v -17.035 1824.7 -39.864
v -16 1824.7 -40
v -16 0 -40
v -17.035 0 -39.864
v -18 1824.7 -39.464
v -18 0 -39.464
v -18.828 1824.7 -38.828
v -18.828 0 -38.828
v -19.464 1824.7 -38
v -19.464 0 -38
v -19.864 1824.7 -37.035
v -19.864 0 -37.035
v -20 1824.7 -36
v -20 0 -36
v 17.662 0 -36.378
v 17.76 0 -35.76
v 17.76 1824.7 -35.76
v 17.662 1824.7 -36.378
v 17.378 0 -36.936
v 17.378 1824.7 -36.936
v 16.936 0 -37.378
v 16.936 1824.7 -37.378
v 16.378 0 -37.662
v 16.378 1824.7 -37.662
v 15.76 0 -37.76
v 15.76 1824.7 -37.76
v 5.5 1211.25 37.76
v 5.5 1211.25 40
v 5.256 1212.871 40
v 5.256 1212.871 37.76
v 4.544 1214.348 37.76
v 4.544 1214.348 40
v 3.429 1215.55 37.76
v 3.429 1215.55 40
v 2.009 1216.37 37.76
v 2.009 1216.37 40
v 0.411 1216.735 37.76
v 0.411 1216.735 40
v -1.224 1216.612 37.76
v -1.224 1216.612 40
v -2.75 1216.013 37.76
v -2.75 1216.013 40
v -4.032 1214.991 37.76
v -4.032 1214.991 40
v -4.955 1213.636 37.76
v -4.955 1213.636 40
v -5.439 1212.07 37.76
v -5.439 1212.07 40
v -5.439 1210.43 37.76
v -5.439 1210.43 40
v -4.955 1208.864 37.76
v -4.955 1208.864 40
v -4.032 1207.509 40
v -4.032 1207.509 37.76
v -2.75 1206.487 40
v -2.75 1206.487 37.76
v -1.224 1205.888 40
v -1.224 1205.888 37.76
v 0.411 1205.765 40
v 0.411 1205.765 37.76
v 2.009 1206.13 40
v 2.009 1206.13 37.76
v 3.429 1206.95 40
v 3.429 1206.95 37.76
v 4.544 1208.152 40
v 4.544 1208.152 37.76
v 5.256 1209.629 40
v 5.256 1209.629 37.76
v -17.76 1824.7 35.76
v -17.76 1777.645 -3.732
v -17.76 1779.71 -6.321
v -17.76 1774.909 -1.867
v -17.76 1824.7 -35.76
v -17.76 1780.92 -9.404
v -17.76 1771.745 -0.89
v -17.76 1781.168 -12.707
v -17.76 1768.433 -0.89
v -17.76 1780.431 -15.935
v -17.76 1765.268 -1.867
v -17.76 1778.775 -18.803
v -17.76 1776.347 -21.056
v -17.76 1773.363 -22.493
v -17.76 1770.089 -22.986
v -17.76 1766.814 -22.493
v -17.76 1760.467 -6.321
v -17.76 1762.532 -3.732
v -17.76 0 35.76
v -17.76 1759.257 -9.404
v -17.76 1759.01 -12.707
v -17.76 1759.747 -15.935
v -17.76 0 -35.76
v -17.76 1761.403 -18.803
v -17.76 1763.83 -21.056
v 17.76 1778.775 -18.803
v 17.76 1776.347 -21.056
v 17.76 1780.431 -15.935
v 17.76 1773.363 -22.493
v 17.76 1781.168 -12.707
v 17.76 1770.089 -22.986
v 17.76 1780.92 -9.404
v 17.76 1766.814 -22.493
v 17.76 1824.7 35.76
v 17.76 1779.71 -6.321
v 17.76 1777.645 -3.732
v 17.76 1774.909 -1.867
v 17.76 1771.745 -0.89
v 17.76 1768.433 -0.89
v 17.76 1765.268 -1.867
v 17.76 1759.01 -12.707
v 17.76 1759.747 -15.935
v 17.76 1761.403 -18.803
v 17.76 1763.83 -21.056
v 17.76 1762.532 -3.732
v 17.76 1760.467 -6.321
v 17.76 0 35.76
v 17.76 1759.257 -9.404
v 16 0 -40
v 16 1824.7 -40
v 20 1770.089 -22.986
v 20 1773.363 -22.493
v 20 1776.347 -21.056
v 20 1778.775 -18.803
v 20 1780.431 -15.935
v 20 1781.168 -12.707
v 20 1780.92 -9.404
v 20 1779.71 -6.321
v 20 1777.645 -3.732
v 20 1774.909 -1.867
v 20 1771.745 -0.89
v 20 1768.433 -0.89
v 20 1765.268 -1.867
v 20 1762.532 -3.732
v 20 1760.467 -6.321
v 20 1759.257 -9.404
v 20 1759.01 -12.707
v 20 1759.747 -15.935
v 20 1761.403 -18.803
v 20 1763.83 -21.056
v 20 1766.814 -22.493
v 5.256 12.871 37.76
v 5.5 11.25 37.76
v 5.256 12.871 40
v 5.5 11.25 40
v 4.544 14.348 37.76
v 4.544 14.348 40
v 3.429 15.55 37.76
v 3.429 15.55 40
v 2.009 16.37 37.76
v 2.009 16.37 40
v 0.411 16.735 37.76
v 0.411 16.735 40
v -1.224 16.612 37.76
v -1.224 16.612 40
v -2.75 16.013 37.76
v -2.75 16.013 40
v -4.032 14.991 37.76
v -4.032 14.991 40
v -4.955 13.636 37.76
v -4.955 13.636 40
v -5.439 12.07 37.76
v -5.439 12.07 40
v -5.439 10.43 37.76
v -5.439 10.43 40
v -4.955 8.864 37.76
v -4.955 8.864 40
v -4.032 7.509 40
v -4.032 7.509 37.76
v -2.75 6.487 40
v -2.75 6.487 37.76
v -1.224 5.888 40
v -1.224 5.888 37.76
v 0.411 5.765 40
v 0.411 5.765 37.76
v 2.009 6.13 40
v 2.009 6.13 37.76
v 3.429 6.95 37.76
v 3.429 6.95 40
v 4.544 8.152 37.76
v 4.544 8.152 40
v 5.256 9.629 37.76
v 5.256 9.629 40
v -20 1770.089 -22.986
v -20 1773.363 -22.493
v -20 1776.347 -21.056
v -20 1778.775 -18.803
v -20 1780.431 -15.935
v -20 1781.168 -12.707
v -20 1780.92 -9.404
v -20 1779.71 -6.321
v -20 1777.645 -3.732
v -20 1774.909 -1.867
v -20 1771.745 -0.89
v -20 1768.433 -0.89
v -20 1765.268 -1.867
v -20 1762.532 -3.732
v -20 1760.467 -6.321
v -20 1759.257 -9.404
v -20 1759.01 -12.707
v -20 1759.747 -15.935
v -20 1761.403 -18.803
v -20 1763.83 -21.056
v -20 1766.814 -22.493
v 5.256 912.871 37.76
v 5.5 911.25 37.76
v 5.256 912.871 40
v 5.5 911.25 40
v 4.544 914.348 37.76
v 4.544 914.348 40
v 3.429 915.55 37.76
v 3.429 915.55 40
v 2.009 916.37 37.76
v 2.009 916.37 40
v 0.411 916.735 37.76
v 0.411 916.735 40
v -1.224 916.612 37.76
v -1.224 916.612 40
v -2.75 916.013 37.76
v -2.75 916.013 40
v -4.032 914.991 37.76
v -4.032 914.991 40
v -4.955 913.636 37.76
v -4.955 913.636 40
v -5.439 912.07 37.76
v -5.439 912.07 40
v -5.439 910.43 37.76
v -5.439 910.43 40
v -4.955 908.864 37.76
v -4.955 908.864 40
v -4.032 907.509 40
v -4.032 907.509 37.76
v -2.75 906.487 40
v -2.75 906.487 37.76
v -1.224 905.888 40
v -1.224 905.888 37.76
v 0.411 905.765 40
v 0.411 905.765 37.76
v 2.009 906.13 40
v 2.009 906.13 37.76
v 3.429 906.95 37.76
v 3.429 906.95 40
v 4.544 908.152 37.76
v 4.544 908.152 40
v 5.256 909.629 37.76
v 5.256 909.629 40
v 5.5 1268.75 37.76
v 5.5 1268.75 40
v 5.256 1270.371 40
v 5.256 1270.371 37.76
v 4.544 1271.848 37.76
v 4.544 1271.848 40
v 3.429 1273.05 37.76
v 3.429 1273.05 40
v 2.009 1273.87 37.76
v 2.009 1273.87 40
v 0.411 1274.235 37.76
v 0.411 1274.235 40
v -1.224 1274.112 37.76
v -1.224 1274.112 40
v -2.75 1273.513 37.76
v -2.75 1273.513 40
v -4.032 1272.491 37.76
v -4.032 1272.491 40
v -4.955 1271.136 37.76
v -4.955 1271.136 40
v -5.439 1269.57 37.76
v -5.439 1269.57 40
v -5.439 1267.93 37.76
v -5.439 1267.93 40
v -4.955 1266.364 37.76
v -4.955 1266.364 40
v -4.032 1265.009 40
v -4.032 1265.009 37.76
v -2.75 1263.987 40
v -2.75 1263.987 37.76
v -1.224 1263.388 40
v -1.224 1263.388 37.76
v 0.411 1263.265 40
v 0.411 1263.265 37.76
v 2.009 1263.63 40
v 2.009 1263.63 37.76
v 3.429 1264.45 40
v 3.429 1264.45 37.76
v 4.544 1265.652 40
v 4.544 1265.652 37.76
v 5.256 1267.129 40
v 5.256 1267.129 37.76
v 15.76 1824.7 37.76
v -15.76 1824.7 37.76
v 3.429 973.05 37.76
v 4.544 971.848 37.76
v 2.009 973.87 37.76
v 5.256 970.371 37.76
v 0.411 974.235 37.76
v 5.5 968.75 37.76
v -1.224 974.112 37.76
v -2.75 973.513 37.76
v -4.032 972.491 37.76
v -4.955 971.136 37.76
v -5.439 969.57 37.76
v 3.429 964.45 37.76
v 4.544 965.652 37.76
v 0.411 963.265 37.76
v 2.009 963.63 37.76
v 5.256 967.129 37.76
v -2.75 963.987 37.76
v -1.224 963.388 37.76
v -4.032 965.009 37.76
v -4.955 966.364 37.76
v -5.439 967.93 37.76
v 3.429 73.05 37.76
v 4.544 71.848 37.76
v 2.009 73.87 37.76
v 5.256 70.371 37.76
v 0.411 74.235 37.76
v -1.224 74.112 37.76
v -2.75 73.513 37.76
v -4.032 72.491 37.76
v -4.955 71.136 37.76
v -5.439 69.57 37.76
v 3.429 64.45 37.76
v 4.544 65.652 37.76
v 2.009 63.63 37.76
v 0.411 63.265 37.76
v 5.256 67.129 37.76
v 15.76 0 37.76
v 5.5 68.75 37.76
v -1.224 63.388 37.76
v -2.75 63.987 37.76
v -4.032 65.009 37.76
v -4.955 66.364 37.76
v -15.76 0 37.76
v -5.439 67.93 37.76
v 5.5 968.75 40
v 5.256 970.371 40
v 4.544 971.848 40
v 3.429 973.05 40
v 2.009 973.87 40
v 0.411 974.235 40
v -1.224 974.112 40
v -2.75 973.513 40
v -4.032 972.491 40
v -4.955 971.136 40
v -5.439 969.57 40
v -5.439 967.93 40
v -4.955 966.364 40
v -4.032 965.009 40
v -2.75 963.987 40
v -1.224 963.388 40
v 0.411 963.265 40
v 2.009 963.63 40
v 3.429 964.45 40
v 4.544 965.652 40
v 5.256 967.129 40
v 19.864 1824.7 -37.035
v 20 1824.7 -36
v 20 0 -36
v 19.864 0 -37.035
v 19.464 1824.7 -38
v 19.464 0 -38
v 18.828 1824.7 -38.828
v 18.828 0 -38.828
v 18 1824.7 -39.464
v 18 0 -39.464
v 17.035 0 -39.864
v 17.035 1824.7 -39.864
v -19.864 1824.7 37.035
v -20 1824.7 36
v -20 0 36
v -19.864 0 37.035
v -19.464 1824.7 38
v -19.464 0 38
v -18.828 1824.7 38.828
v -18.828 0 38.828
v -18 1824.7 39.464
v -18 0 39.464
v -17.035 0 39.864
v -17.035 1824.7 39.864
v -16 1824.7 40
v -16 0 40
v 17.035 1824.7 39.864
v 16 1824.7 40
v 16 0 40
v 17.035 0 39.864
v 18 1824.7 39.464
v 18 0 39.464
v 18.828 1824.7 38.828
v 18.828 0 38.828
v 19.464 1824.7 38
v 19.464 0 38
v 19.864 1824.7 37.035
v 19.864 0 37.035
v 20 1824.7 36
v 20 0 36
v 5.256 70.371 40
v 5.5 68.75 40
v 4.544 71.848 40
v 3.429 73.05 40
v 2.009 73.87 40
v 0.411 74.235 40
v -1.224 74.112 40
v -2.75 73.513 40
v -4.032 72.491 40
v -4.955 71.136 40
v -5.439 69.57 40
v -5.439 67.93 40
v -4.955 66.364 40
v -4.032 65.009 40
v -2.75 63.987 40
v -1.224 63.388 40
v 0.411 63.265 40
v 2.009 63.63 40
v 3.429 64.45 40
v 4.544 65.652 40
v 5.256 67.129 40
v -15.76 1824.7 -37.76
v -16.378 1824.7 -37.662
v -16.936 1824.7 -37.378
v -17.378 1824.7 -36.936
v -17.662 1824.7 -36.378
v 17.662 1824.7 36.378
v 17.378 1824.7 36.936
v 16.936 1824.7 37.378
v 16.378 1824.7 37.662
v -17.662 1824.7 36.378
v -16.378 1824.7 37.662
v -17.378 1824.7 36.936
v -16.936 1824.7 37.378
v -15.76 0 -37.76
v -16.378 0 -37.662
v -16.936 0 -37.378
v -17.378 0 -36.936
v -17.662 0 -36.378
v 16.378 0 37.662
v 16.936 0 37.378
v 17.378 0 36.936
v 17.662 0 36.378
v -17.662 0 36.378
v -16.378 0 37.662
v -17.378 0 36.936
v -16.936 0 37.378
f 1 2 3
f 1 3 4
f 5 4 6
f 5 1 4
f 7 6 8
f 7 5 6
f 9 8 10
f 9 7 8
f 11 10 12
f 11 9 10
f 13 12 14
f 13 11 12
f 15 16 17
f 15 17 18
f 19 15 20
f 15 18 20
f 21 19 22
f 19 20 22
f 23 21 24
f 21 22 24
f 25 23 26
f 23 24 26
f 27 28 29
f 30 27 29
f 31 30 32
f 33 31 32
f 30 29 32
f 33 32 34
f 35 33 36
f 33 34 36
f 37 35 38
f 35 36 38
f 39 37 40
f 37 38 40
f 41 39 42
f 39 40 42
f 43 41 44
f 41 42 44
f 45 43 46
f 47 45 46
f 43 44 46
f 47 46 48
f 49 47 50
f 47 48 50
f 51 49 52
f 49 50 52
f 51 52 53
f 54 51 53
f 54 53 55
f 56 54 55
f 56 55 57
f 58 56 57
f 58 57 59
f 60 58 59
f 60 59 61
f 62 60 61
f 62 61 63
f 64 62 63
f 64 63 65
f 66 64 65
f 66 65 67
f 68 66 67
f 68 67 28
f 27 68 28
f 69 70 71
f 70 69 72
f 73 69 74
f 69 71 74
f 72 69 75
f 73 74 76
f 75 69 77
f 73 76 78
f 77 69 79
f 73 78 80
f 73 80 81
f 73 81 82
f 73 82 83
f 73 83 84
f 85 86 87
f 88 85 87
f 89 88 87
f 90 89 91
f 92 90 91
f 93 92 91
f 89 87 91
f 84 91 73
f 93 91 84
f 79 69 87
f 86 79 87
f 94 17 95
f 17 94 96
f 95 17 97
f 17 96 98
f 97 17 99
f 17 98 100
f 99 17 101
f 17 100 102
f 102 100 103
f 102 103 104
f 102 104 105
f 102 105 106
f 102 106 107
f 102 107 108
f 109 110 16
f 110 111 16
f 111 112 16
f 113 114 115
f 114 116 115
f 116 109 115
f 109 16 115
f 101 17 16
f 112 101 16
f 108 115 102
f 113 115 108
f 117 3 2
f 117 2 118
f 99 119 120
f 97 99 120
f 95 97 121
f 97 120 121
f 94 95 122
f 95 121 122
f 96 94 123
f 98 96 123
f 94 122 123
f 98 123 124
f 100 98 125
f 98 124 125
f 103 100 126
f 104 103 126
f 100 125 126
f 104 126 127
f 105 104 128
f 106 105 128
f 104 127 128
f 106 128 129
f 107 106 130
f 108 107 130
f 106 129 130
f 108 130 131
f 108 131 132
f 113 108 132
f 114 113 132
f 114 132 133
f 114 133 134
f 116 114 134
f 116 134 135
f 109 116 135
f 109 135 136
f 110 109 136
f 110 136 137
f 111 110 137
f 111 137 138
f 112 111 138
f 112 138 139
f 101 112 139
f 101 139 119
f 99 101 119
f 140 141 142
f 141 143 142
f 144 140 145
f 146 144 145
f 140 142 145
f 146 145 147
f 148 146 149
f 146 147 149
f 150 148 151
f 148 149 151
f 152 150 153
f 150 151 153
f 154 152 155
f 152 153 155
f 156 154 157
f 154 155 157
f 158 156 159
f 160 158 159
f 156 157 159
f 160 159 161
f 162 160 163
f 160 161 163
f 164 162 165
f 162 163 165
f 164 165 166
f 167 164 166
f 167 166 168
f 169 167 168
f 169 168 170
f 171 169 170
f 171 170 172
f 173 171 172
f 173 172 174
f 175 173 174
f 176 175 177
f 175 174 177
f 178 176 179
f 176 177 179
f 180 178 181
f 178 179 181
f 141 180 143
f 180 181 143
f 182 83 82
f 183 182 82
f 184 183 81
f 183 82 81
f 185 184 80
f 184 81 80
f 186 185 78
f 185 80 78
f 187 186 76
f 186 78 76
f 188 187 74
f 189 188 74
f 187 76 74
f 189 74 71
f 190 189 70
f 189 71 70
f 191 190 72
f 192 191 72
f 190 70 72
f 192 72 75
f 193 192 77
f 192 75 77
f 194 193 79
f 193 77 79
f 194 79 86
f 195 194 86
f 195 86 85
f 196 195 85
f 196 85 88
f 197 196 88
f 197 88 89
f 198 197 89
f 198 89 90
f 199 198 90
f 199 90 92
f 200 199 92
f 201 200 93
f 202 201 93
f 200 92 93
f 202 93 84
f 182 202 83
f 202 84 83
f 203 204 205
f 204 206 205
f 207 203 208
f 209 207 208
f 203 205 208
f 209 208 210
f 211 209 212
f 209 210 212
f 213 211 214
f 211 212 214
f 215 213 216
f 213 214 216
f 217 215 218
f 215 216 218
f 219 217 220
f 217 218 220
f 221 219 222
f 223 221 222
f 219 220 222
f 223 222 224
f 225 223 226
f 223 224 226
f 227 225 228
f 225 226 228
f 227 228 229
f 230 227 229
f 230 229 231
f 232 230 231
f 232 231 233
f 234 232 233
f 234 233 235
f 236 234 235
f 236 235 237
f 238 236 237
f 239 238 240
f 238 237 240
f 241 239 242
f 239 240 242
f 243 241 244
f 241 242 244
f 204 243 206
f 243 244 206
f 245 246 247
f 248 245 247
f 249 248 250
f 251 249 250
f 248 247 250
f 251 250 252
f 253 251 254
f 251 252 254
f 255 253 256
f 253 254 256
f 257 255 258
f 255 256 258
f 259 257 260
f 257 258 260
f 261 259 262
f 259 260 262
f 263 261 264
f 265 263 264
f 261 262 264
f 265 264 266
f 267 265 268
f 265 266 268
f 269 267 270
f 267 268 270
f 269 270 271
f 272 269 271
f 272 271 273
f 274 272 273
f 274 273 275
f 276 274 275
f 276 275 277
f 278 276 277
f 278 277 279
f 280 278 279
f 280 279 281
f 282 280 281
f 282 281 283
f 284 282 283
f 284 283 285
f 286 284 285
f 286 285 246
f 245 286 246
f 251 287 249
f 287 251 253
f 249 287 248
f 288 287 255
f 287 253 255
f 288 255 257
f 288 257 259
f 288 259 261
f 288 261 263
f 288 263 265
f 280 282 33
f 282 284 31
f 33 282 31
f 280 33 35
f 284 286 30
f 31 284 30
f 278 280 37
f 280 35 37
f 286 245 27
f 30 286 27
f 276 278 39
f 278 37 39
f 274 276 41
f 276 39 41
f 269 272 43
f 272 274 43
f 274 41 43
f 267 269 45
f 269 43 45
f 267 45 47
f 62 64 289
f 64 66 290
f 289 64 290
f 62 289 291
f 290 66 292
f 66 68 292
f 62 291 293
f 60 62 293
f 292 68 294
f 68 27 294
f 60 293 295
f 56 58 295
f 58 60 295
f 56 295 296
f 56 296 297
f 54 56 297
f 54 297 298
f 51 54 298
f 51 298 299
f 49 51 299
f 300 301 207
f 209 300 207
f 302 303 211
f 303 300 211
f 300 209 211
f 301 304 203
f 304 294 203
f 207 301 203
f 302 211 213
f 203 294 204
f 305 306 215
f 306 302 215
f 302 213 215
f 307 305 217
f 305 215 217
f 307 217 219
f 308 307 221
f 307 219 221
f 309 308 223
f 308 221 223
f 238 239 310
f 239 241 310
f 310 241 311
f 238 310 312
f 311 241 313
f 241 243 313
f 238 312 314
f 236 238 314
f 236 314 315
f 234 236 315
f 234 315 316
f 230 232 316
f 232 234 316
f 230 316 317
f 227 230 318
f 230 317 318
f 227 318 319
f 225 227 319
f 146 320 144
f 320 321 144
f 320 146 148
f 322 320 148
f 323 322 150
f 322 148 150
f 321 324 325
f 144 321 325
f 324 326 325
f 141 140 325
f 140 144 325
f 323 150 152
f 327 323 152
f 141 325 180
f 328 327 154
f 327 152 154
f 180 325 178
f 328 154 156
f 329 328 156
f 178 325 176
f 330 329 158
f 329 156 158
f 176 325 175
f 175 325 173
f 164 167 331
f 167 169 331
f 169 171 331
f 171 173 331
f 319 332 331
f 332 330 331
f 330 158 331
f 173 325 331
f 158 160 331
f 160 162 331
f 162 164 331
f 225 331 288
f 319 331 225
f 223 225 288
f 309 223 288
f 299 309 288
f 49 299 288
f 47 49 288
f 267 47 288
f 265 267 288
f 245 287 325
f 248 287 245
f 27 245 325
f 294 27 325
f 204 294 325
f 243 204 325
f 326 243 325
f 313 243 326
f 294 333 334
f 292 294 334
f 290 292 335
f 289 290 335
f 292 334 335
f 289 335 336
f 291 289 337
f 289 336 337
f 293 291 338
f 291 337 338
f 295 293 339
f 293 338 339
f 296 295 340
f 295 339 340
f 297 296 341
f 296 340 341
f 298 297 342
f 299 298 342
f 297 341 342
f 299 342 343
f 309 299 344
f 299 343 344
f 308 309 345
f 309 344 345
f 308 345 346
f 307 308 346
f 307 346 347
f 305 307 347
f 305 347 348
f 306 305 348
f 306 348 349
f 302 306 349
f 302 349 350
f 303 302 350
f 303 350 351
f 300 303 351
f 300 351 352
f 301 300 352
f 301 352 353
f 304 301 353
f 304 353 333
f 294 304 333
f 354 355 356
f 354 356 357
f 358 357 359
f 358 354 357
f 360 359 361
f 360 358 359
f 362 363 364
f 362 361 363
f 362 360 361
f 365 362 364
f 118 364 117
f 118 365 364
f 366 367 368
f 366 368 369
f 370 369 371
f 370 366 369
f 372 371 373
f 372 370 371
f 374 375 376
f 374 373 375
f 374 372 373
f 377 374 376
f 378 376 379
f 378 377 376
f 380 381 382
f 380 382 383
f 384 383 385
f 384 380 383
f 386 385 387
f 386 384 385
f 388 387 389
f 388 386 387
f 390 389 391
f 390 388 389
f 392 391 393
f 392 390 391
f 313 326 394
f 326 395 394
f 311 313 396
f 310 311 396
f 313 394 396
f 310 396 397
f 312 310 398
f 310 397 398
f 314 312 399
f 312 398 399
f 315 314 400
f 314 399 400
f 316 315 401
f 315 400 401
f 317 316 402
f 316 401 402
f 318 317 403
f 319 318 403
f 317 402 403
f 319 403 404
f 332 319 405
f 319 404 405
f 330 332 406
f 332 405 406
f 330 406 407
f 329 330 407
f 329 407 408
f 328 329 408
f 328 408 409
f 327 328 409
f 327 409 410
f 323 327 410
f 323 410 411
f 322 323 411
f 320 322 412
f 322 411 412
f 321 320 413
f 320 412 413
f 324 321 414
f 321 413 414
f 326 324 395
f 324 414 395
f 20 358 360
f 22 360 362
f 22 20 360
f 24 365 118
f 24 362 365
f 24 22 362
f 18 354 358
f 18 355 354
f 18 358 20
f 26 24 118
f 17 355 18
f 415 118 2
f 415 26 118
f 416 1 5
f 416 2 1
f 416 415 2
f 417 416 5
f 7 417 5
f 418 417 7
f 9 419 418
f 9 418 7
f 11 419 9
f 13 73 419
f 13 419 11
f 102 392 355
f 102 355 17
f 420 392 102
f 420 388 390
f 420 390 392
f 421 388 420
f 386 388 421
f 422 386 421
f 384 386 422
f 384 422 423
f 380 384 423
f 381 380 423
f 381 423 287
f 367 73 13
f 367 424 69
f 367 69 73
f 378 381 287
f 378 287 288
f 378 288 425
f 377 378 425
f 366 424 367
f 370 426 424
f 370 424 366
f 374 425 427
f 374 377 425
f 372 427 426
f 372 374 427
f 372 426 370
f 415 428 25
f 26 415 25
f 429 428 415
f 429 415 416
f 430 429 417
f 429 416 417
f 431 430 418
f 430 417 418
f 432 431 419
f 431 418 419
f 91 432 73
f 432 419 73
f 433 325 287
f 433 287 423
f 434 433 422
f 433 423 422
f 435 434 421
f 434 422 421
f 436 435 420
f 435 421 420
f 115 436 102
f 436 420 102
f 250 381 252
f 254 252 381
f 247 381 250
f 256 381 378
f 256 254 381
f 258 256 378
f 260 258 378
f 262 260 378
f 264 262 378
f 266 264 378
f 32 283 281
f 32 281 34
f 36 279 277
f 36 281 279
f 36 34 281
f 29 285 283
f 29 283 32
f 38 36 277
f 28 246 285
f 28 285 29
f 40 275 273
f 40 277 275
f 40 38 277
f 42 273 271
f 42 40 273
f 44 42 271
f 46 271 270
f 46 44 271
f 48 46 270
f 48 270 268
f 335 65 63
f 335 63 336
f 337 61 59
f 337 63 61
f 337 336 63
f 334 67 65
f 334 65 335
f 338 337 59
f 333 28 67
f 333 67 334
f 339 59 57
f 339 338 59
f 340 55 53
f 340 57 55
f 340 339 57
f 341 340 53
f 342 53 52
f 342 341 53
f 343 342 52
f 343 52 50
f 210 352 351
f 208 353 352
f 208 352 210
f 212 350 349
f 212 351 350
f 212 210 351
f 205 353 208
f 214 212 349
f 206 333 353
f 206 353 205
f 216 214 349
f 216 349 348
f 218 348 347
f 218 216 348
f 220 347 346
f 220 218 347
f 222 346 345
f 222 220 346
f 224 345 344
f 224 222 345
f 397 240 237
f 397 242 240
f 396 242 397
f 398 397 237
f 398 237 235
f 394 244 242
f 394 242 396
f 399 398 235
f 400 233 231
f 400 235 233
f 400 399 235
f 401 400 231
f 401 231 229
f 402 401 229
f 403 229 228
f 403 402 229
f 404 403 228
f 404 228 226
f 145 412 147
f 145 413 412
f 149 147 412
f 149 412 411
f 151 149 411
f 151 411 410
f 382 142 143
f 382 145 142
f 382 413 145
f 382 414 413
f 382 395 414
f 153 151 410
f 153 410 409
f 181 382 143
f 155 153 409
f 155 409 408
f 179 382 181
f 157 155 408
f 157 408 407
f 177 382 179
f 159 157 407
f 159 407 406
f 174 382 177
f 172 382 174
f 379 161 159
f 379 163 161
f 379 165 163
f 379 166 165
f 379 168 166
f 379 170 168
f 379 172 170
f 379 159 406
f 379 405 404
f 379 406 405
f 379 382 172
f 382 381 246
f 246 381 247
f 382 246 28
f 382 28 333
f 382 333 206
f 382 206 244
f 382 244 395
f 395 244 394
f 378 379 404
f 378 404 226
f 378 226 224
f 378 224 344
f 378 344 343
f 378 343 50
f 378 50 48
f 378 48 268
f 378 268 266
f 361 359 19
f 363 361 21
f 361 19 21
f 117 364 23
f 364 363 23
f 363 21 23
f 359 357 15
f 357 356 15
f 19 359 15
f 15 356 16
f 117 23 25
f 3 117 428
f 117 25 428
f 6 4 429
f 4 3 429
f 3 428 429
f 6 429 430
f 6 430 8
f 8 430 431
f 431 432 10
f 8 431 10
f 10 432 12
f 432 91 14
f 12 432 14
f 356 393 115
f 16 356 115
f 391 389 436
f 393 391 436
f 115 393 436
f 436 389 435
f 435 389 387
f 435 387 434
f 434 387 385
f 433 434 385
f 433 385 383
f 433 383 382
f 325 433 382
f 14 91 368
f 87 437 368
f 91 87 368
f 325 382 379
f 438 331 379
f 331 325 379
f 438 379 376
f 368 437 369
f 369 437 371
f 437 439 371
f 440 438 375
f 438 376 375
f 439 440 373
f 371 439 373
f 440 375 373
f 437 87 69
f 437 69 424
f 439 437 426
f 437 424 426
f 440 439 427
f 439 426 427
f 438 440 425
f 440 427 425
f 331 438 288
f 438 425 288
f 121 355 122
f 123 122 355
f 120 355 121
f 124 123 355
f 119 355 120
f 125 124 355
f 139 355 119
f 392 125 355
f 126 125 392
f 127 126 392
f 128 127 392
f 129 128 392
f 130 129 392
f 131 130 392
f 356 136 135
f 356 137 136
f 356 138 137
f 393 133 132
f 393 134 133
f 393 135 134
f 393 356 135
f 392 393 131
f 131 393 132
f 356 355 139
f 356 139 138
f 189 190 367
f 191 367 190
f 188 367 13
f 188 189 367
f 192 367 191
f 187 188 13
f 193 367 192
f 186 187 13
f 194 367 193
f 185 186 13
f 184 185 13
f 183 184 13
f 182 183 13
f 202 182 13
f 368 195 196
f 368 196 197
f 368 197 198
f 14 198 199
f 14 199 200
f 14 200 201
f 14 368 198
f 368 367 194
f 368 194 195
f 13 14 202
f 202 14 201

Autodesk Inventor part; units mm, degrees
ref_plane "YZ Plane" through (0, 0, 0) normal (1, 0, 0) x (0, 1, 0)
ref_plane "XZ Plane" through (0, 0, 0) normal (0, 1, 0) x (-1, 0, 0)
ref_plane "XY Plane" through (0, 0, 0) normal (0, 0, 1) x (1, 0, 0)
sketch "Sketch1" plane through (0, 0, 0) normal (0, 1, 0) x (-1, 0, 0)
  line L0 (-20, 40) -> (20, 40)
  line L1 (20, 40) -> (20, -40)
  line L2 (20, -40) -> (-20, -40)
  line L3 (-20, -40) -> (-20, 40)
  line L4 (-20, 40) -> (20, -40) construction
  line L5 (20, 40) -> (-20, -40) construction
  line L6 (-17.76, 37.76) -> (17.76, 37.76)
  line L7 (17.76, 37.76) -> (17.76, -37.76)
  line L8 (17.76, -37.76) -> (-17.76, -37.76)
  line L9 (-17.76, -37.76) -> (-17.76, 37.76)
  line L10 (-17.76, 37.76) -> (17.76, -37.76) construction
  line L11 (17.76, 37.76) -> (-17.76, -37.76) construction
  point P0 (0, 0)
  dimension "d0" = 40
  dimension "d1" = 80
  dimension "d2" = 35.52
  dimension "d10" = 2.24
extrude "Extrusion1" add sketch "Sketch1" along normal blind 1824.7
fillet "Fillet1" radius 2 4 edges at (-17.76, 912.35, 37.76) (17.76, 912.35, -37.76) (17.76, 912.35, 37.76) (-17.76, 912.35, -37.76)
fillet "Fillet1" radius 4 4 edges at (20, 912.35, 40) (-20, 912.35, 40) (20, 912.35, -40) (-20, 912.35, -40)
sketch "Boceto3" plane through (-16, 0, 40) normal (0, 0, 1) x (1, 0, 0)
  circle A0 centre (16, 11.25) radius 4.5 projected
  circle A1 centre (16, 68.75) radius 4.5 projected
  circle A2 centre (16, 911.25) radius 4.5 projected
  circle A3 centre (16, 968.75) radius 4.5 projected
  circle A4 centre (16, 1268.75) radius 4.5 projected
  circle A5 centre (16, 1211.25) radius 4.5 projected
  circle A6 centre (16, 968.75) radius 5.5
  circle A7 centre (16, 911.25) radius 5.5
  circle A8 centre (16, 68.75) radius 5.5
  circle A9 centre (16, 11.25) radius 5.5
  circle A10 centre (16, 1268.75) radius 5.5
  circle A11 centre (16, 1211.25) radius 5.5
  point P0 (16, 0)
  dimension "d11" = 11
  dimension "d12" = 11
  dimension "d13" = 11
  dimension "d14" = 11
  dimension "d15" = 11
  dimension "d16" = 11
extrude "Extrusión3" cut sketch "Boceto3" against normal blind 10 contours A0 | A1 | A2 | A3 | A4 | A5 | A6 | A7 | A8 | A9 | A10 | A11
sketch "Sketch8" plane through (20, 0, 36) normal (1, 0, 0) x (0, 0, -1)
  circle A0 centre (47.8764, 1770.0887) radius 11.11 projected
  point P0 (36, 0)
extrude "Extrusion7" cut sketch "Sketch8" against normal through all
properties part number "tubo2-40x40x1800" material "Acero, carbono"
